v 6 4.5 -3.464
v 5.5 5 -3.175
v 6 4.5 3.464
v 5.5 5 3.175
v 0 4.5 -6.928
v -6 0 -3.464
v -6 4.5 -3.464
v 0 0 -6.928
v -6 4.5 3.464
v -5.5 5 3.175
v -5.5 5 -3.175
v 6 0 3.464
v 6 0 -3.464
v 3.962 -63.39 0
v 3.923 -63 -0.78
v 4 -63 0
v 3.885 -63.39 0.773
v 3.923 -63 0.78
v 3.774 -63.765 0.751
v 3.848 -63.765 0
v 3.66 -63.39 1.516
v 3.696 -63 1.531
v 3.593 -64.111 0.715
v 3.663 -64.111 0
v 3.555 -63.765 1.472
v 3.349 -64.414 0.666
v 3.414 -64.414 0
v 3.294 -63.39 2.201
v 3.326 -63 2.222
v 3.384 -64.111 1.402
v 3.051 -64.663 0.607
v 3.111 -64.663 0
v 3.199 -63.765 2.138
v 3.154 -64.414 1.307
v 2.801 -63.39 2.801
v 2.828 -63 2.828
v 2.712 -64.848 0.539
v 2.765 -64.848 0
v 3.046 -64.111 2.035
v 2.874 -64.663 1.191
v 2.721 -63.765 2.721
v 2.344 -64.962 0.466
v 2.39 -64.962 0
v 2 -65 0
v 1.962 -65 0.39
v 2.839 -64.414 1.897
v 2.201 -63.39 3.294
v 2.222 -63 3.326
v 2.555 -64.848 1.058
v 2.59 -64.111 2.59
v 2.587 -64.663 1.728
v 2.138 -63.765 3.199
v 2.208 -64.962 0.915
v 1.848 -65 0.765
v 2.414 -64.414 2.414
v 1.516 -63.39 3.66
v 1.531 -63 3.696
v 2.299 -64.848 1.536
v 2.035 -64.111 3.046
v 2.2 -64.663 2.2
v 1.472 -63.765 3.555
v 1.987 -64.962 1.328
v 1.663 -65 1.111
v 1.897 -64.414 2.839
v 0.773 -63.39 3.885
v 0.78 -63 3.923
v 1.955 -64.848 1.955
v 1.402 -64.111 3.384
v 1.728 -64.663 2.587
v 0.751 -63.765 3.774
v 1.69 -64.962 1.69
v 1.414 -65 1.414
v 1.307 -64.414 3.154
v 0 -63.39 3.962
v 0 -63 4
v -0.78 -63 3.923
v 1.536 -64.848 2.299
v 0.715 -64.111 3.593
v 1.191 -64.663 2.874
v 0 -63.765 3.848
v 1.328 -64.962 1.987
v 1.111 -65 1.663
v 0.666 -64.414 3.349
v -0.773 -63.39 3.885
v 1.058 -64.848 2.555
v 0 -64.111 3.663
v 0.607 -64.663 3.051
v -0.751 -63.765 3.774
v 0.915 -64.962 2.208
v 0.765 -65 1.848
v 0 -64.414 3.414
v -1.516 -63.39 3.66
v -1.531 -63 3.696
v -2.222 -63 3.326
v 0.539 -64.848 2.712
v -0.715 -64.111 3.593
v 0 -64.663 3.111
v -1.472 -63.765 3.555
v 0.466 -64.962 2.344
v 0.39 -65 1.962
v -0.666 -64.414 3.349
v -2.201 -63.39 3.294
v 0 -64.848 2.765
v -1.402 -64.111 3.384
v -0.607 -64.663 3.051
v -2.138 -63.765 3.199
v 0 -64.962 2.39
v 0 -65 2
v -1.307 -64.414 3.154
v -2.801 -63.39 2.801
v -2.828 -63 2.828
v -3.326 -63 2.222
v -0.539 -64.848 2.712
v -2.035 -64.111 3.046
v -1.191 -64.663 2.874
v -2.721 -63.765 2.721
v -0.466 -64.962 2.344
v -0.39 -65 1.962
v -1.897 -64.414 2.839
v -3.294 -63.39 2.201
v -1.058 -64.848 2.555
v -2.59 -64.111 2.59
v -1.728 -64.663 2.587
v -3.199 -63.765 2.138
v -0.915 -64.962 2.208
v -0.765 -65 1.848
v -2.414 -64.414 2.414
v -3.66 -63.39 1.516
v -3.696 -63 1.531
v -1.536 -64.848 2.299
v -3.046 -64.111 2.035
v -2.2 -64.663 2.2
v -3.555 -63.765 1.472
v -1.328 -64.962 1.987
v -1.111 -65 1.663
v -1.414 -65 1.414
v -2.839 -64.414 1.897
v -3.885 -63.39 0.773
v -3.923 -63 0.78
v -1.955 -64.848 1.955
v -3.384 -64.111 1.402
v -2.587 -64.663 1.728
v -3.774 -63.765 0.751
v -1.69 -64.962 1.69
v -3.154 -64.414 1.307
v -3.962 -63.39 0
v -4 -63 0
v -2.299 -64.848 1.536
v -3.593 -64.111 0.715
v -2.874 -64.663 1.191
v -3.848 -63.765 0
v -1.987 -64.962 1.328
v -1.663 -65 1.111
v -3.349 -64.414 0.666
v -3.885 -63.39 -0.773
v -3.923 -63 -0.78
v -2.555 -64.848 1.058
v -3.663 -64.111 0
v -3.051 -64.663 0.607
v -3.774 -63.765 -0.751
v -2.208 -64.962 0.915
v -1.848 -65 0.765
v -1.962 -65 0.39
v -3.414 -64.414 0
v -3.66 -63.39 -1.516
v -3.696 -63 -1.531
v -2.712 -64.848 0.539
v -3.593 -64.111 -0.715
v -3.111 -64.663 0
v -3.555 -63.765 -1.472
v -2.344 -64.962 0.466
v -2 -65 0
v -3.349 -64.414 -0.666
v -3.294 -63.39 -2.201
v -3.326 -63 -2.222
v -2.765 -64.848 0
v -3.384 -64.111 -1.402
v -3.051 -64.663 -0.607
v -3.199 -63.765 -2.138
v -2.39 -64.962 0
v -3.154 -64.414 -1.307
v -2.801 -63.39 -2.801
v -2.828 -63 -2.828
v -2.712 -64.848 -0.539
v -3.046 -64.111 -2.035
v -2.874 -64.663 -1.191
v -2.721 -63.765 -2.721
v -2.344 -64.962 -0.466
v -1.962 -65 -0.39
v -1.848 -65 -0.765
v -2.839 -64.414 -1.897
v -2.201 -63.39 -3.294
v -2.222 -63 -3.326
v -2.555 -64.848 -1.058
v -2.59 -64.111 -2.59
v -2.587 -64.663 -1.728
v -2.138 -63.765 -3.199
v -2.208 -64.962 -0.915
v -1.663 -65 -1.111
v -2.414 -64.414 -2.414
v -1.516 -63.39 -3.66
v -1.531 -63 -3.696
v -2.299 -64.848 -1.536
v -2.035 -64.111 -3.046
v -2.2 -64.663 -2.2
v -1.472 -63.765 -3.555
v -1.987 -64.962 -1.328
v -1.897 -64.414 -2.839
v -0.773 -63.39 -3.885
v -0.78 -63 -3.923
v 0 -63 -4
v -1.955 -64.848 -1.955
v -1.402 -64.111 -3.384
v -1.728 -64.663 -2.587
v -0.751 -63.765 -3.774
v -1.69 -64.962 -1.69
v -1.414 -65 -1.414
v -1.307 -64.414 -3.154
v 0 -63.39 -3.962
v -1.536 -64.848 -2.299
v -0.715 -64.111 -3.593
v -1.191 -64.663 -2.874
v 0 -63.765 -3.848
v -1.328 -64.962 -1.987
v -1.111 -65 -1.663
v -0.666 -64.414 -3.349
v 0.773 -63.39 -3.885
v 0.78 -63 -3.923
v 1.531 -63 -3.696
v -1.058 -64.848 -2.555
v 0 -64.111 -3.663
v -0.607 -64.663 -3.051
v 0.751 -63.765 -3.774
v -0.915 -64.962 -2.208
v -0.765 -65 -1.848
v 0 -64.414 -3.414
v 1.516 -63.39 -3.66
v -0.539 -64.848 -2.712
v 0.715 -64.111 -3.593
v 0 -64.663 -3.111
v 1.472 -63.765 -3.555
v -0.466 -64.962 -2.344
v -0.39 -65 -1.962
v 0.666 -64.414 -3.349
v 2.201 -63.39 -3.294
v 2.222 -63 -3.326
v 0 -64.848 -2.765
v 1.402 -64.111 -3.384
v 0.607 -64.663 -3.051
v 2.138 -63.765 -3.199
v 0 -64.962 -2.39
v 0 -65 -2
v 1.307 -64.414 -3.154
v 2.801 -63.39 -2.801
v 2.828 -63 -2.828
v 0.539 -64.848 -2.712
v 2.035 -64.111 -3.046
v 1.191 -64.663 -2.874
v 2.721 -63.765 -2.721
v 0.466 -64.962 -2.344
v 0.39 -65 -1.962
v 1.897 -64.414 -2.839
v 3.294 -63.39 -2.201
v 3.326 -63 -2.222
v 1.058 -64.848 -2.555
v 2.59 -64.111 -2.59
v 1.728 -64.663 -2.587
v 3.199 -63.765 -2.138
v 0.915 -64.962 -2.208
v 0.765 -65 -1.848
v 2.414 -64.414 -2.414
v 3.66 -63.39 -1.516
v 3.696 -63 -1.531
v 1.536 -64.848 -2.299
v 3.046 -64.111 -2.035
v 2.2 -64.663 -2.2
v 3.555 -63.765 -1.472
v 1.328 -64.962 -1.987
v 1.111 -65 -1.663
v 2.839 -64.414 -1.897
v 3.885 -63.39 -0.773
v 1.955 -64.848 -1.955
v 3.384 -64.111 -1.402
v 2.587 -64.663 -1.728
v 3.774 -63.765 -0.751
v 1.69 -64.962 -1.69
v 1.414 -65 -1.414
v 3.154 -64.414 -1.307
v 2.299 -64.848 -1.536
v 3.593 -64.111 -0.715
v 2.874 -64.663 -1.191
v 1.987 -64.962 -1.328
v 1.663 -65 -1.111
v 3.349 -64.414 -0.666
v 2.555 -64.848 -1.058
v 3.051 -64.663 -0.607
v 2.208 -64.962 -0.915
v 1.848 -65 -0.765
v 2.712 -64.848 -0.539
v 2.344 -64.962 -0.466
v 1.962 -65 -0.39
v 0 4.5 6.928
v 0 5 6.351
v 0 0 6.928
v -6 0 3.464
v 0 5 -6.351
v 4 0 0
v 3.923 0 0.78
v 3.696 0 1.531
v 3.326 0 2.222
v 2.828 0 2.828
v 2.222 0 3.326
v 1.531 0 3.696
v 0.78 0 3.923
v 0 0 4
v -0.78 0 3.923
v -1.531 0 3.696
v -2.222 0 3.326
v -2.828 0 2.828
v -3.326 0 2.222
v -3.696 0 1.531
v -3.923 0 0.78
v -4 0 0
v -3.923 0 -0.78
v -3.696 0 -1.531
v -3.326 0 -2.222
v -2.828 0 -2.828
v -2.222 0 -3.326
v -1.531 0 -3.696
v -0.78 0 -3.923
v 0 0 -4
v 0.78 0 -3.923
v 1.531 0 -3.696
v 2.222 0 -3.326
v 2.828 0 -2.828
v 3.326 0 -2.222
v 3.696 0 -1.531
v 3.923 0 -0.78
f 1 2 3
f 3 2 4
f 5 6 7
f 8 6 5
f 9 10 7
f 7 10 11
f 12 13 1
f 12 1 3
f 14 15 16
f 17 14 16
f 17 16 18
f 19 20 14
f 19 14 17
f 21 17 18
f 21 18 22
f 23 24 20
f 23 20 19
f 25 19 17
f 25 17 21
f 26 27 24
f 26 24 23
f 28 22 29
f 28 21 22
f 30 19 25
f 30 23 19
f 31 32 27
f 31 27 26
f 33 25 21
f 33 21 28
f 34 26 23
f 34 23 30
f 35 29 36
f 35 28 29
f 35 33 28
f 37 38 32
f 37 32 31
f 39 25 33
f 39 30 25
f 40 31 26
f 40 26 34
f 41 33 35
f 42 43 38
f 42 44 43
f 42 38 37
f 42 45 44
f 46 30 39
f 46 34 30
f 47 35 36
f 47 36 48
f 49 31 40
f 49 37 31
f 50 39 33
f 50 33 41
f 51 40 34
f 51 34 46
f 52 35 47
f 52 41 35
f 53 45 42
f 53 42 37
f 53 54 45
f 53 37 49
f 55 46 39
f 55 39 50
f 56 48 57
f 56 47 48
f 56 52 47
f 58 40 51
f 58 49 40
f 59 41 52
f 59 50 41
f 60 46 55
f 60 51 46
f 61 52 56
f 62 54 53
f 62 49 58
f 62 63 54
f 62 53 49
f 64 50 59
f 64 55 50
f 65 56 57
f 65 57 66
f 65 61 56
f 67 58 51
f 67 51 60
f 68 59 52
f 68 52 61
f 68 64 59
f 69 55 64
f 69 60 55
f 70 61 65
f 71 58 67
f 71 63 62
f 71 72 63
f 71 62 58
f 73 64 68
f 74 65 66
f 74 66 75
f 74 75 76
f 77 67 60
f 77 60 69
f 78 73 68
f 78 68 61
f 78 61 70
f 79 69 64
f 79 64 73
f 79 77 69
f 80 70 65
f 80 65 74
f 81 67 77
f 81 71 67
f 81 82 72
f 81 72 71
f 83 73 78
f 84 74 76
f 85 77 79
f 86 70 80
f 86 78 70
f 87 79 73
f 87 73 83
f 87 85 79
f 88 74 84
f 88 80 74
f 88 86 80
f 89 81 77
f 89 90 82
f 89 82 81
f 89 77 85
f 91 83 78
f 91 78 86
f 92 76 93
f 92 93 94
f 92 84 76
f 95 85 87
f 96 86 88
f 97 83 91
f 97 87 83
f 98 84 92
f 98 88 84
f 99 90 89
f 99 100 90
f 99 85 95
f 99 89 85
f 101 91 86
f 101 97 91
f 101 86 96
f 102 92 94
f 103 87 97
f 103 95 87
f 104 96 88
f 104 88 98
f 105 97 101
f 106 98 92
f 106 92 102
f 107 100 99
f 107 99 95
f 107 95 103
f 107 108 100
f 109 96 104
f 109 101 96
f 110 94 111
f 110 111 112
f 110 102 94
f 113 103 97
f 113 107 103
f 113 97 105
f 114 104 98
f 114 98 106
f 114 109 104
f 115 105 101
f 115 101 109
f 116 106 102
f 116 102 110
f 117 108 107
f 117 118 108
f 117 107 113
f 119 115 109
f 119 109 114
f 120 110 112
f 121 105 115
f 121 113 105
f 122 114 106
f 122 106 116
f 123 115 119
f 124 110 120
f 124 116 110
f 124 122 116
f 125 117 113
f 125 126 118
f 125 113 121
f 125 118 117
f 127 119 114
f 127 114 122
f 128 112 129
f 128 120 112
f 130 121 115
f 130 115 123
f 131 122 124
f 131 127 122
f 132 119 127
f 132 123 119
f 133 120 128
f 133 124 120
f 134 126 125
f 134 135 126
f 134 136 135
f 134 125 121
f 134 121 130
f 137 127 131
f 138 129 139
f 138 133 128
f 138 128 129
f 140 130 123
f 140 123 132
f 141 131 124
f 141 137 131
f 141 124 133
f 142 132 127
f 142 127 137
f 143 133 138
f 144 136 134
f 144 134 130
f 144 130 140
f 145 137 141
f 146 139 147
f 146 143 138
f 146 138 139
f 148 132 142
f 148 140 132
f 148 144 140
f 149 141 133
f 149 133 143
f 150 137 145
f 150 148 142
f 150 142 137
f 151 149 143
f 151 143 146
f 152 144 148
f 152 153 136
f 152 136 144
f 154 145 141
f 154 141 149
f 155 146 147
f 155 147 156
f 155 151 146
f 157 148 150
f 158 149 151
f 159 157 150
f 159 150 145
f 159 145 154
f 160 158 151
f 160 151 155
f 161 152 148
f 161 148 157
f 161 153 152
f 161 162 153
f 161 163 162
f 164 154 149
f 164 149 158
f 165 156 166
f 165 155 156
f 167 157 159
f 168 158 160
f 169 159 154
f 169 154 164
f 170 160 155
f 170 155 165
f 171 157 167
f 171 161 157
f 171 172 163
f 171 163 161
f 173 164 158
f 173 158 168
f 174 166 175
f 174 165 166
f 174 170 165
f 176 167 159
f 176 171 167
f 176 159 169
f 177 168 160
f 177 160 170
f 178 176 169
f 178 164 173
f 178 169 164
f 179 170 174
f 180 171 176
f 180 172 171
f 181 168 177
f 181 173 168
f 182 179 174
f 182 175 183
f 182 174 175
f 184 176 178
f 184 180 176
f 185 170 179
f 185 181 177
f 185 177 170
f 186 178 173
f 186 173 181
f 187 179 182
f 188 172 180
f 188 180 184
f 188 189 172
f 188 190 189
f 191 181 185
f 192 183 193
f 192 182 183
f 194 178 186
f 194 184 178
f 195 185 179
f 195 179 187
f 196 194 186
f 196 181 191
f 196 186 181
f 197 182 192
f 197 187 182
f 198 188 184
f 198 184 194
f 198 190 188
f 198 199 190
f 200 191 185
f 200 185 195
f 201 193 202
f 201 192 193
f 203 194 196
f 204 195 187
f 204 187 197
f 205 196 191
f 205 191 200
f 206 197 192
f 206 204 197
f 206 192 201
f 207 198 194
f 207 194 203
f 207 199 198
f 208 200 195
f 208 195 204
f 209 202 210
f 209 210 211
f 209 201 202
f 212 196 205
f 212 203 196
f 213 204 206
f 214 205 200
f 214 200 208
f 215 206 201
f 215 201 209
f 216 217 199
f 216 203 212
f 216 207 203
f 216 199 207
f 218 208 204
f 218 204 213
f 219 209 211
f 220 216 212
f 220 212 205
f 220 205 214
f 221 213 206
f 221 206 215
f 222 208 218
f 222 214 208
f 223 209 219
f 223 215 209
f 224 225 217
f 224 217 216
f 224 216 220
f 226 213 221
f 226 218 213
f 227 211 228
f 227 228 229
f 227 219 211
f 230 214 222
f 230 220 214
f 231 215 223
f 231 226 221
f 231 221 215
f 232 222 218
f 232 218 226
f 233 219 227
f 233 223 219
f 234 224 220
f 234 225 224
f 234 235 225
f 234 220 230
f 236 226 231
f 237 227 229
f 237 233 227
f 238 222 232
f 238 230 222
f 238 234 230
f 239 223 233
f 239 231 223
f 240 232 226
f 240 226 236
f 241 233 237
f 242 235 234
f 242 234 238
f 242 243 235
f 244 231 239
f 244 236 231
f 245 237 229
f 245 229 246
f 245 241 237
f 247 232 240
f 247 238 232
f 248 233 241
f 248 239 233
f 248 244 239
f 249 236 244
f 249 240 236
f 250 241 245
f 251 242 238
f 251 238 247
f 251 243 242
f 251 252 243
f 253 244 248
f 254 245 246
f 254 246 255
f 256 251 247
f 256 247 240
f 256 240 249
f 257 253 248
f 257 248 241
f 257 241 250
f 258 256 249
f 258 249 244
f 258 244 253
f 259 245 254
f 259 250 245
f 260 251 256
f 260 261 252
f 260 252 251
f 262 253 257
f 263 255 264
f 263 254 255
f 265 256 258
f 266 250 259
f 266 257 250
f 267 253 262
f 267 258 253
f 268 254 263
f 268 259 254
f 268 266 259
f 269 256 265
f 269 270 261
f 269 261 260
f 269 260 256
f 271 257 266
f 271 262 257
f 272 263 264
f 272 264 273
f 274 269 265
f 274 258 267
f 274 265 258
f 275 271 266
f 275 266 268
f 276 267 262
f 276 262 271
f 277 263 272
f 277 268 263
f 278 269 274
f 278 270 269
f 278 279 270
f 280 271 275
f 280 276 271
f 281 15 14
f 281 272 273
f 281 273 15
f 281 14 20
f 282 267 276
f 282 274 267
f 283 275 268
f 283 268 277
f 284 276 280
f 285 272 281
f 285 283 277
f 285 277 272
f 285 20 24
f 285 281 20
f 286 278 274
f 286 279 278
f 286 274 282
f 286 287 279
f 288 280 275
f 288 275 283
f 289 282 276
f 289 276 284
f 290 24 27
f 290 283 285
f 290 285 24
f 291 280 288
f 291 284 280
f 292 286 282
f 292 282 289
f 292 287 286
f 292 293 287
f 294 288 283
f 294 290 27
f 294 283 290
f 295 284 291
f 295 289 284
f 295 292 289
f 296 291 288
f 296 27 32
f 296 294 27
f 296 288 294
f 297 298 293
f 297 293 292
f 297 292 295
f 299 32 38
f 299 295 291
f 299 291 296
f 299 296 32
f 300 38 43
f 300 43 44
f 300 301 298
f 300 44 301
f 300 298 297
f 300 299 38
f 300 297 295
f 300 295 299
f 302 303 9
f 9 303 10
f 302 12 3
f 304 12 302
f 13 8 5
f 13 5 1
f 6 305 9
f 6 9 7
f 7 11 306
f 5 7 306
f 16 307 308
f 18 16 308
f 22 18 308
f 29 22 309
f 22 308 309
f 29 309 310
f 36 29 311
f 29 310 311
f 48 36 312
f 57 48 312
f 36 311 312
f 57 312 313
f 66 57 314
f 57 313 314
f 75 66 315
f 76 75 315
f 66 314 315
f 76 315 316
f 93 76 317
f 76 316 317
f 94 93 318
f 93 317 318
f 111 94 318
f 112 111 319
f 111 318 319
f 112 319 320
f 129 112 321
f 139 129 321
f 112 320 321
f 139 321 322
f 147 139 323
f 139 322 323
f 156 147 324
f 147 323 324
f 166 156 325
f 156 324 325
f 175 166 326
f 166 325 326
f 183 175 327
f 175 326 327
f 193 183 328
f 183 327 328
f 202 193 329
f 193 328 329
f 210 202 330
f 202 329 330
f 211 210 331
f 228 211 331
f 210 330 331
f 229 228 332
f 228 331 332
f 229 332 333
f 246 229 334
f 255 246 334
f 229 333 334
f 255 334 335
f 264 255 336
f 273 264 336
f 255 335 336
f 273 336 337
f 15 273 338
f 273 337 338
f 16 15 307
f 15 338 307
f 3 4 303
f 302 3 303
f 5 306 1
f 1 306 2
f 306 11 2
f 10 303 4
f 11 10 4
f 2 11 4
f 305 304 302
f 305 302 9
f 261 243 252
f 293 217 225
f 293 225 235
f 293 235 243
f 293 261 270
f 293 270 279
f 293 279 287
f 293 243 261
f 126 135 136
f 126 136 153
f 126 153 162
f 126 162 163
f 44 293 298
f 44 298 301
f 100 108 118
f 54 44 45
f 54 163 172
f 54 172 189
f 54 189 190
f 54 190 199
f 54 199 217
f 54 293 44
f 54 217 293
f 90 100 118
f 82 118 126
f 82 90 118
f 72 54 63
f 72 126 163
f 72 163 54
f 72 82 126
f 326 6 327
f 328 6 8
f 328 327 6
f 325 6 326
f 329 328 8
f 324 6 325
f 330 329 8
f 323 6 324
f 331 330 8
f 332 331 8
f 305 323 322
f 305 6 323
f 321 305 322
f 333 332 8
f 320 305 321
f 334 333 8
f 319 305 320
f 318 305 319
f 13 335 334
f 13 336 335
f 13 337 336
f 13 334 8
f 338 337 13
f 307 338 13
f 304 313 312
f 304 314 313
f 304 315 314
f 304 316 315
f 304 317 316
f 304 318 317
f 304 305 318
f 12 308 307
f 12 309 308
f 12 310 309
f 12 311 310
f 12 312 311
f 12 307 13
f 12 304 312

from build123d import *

# Parameters (mm, degrees)
F1_DEPTH = 5
F2_SIZE  = 0.5
F3_R     = 4
F4_DEPTH = 65
F5_R     = 2


with BuildPart() as f1:
    # F0 (on Front) → F1 (new body)
    with BuildSketch(Plane.XZ):
        Polygon((0, 6.9282032303), (-6, 3.4641016151), (-6, 0), (-6, -3.4641016151), (0, -6.9282032303), (3, -5.1961524227), (6, -3.4641016151), (6, 0), (6, 3.4641016151), (3, 5.1961524227), align=None)
    extrude(amount=-F1_DEPTH)

    # F2
    f2_edges = [f1.edges().sort_by_distance(p)[0] for p in [
        (-3, 5, 5.196152),
        (-6, 5, 0),
        (-3, 5, -5.196152),
        (3, 5, -5.196152),
        (6, 5, 0),
        (3, 5, 5.196152),
    ]]
    chamfer(f2_edges, length=F2_SIZE)

    # F3 (on face) → F4 (join)
    with BuildSketch(Plane.XZ):
        Circle(F3_R)
    extrude(amount=F4_DEPTH)

    # F5
    f5_edges = [f1.edges().sort_by_distance(p)[0] for p in [
        (-4, -65, 0),
    ]]
    fillet(f5_edges, radius=F5_R)


solid = f1.part
